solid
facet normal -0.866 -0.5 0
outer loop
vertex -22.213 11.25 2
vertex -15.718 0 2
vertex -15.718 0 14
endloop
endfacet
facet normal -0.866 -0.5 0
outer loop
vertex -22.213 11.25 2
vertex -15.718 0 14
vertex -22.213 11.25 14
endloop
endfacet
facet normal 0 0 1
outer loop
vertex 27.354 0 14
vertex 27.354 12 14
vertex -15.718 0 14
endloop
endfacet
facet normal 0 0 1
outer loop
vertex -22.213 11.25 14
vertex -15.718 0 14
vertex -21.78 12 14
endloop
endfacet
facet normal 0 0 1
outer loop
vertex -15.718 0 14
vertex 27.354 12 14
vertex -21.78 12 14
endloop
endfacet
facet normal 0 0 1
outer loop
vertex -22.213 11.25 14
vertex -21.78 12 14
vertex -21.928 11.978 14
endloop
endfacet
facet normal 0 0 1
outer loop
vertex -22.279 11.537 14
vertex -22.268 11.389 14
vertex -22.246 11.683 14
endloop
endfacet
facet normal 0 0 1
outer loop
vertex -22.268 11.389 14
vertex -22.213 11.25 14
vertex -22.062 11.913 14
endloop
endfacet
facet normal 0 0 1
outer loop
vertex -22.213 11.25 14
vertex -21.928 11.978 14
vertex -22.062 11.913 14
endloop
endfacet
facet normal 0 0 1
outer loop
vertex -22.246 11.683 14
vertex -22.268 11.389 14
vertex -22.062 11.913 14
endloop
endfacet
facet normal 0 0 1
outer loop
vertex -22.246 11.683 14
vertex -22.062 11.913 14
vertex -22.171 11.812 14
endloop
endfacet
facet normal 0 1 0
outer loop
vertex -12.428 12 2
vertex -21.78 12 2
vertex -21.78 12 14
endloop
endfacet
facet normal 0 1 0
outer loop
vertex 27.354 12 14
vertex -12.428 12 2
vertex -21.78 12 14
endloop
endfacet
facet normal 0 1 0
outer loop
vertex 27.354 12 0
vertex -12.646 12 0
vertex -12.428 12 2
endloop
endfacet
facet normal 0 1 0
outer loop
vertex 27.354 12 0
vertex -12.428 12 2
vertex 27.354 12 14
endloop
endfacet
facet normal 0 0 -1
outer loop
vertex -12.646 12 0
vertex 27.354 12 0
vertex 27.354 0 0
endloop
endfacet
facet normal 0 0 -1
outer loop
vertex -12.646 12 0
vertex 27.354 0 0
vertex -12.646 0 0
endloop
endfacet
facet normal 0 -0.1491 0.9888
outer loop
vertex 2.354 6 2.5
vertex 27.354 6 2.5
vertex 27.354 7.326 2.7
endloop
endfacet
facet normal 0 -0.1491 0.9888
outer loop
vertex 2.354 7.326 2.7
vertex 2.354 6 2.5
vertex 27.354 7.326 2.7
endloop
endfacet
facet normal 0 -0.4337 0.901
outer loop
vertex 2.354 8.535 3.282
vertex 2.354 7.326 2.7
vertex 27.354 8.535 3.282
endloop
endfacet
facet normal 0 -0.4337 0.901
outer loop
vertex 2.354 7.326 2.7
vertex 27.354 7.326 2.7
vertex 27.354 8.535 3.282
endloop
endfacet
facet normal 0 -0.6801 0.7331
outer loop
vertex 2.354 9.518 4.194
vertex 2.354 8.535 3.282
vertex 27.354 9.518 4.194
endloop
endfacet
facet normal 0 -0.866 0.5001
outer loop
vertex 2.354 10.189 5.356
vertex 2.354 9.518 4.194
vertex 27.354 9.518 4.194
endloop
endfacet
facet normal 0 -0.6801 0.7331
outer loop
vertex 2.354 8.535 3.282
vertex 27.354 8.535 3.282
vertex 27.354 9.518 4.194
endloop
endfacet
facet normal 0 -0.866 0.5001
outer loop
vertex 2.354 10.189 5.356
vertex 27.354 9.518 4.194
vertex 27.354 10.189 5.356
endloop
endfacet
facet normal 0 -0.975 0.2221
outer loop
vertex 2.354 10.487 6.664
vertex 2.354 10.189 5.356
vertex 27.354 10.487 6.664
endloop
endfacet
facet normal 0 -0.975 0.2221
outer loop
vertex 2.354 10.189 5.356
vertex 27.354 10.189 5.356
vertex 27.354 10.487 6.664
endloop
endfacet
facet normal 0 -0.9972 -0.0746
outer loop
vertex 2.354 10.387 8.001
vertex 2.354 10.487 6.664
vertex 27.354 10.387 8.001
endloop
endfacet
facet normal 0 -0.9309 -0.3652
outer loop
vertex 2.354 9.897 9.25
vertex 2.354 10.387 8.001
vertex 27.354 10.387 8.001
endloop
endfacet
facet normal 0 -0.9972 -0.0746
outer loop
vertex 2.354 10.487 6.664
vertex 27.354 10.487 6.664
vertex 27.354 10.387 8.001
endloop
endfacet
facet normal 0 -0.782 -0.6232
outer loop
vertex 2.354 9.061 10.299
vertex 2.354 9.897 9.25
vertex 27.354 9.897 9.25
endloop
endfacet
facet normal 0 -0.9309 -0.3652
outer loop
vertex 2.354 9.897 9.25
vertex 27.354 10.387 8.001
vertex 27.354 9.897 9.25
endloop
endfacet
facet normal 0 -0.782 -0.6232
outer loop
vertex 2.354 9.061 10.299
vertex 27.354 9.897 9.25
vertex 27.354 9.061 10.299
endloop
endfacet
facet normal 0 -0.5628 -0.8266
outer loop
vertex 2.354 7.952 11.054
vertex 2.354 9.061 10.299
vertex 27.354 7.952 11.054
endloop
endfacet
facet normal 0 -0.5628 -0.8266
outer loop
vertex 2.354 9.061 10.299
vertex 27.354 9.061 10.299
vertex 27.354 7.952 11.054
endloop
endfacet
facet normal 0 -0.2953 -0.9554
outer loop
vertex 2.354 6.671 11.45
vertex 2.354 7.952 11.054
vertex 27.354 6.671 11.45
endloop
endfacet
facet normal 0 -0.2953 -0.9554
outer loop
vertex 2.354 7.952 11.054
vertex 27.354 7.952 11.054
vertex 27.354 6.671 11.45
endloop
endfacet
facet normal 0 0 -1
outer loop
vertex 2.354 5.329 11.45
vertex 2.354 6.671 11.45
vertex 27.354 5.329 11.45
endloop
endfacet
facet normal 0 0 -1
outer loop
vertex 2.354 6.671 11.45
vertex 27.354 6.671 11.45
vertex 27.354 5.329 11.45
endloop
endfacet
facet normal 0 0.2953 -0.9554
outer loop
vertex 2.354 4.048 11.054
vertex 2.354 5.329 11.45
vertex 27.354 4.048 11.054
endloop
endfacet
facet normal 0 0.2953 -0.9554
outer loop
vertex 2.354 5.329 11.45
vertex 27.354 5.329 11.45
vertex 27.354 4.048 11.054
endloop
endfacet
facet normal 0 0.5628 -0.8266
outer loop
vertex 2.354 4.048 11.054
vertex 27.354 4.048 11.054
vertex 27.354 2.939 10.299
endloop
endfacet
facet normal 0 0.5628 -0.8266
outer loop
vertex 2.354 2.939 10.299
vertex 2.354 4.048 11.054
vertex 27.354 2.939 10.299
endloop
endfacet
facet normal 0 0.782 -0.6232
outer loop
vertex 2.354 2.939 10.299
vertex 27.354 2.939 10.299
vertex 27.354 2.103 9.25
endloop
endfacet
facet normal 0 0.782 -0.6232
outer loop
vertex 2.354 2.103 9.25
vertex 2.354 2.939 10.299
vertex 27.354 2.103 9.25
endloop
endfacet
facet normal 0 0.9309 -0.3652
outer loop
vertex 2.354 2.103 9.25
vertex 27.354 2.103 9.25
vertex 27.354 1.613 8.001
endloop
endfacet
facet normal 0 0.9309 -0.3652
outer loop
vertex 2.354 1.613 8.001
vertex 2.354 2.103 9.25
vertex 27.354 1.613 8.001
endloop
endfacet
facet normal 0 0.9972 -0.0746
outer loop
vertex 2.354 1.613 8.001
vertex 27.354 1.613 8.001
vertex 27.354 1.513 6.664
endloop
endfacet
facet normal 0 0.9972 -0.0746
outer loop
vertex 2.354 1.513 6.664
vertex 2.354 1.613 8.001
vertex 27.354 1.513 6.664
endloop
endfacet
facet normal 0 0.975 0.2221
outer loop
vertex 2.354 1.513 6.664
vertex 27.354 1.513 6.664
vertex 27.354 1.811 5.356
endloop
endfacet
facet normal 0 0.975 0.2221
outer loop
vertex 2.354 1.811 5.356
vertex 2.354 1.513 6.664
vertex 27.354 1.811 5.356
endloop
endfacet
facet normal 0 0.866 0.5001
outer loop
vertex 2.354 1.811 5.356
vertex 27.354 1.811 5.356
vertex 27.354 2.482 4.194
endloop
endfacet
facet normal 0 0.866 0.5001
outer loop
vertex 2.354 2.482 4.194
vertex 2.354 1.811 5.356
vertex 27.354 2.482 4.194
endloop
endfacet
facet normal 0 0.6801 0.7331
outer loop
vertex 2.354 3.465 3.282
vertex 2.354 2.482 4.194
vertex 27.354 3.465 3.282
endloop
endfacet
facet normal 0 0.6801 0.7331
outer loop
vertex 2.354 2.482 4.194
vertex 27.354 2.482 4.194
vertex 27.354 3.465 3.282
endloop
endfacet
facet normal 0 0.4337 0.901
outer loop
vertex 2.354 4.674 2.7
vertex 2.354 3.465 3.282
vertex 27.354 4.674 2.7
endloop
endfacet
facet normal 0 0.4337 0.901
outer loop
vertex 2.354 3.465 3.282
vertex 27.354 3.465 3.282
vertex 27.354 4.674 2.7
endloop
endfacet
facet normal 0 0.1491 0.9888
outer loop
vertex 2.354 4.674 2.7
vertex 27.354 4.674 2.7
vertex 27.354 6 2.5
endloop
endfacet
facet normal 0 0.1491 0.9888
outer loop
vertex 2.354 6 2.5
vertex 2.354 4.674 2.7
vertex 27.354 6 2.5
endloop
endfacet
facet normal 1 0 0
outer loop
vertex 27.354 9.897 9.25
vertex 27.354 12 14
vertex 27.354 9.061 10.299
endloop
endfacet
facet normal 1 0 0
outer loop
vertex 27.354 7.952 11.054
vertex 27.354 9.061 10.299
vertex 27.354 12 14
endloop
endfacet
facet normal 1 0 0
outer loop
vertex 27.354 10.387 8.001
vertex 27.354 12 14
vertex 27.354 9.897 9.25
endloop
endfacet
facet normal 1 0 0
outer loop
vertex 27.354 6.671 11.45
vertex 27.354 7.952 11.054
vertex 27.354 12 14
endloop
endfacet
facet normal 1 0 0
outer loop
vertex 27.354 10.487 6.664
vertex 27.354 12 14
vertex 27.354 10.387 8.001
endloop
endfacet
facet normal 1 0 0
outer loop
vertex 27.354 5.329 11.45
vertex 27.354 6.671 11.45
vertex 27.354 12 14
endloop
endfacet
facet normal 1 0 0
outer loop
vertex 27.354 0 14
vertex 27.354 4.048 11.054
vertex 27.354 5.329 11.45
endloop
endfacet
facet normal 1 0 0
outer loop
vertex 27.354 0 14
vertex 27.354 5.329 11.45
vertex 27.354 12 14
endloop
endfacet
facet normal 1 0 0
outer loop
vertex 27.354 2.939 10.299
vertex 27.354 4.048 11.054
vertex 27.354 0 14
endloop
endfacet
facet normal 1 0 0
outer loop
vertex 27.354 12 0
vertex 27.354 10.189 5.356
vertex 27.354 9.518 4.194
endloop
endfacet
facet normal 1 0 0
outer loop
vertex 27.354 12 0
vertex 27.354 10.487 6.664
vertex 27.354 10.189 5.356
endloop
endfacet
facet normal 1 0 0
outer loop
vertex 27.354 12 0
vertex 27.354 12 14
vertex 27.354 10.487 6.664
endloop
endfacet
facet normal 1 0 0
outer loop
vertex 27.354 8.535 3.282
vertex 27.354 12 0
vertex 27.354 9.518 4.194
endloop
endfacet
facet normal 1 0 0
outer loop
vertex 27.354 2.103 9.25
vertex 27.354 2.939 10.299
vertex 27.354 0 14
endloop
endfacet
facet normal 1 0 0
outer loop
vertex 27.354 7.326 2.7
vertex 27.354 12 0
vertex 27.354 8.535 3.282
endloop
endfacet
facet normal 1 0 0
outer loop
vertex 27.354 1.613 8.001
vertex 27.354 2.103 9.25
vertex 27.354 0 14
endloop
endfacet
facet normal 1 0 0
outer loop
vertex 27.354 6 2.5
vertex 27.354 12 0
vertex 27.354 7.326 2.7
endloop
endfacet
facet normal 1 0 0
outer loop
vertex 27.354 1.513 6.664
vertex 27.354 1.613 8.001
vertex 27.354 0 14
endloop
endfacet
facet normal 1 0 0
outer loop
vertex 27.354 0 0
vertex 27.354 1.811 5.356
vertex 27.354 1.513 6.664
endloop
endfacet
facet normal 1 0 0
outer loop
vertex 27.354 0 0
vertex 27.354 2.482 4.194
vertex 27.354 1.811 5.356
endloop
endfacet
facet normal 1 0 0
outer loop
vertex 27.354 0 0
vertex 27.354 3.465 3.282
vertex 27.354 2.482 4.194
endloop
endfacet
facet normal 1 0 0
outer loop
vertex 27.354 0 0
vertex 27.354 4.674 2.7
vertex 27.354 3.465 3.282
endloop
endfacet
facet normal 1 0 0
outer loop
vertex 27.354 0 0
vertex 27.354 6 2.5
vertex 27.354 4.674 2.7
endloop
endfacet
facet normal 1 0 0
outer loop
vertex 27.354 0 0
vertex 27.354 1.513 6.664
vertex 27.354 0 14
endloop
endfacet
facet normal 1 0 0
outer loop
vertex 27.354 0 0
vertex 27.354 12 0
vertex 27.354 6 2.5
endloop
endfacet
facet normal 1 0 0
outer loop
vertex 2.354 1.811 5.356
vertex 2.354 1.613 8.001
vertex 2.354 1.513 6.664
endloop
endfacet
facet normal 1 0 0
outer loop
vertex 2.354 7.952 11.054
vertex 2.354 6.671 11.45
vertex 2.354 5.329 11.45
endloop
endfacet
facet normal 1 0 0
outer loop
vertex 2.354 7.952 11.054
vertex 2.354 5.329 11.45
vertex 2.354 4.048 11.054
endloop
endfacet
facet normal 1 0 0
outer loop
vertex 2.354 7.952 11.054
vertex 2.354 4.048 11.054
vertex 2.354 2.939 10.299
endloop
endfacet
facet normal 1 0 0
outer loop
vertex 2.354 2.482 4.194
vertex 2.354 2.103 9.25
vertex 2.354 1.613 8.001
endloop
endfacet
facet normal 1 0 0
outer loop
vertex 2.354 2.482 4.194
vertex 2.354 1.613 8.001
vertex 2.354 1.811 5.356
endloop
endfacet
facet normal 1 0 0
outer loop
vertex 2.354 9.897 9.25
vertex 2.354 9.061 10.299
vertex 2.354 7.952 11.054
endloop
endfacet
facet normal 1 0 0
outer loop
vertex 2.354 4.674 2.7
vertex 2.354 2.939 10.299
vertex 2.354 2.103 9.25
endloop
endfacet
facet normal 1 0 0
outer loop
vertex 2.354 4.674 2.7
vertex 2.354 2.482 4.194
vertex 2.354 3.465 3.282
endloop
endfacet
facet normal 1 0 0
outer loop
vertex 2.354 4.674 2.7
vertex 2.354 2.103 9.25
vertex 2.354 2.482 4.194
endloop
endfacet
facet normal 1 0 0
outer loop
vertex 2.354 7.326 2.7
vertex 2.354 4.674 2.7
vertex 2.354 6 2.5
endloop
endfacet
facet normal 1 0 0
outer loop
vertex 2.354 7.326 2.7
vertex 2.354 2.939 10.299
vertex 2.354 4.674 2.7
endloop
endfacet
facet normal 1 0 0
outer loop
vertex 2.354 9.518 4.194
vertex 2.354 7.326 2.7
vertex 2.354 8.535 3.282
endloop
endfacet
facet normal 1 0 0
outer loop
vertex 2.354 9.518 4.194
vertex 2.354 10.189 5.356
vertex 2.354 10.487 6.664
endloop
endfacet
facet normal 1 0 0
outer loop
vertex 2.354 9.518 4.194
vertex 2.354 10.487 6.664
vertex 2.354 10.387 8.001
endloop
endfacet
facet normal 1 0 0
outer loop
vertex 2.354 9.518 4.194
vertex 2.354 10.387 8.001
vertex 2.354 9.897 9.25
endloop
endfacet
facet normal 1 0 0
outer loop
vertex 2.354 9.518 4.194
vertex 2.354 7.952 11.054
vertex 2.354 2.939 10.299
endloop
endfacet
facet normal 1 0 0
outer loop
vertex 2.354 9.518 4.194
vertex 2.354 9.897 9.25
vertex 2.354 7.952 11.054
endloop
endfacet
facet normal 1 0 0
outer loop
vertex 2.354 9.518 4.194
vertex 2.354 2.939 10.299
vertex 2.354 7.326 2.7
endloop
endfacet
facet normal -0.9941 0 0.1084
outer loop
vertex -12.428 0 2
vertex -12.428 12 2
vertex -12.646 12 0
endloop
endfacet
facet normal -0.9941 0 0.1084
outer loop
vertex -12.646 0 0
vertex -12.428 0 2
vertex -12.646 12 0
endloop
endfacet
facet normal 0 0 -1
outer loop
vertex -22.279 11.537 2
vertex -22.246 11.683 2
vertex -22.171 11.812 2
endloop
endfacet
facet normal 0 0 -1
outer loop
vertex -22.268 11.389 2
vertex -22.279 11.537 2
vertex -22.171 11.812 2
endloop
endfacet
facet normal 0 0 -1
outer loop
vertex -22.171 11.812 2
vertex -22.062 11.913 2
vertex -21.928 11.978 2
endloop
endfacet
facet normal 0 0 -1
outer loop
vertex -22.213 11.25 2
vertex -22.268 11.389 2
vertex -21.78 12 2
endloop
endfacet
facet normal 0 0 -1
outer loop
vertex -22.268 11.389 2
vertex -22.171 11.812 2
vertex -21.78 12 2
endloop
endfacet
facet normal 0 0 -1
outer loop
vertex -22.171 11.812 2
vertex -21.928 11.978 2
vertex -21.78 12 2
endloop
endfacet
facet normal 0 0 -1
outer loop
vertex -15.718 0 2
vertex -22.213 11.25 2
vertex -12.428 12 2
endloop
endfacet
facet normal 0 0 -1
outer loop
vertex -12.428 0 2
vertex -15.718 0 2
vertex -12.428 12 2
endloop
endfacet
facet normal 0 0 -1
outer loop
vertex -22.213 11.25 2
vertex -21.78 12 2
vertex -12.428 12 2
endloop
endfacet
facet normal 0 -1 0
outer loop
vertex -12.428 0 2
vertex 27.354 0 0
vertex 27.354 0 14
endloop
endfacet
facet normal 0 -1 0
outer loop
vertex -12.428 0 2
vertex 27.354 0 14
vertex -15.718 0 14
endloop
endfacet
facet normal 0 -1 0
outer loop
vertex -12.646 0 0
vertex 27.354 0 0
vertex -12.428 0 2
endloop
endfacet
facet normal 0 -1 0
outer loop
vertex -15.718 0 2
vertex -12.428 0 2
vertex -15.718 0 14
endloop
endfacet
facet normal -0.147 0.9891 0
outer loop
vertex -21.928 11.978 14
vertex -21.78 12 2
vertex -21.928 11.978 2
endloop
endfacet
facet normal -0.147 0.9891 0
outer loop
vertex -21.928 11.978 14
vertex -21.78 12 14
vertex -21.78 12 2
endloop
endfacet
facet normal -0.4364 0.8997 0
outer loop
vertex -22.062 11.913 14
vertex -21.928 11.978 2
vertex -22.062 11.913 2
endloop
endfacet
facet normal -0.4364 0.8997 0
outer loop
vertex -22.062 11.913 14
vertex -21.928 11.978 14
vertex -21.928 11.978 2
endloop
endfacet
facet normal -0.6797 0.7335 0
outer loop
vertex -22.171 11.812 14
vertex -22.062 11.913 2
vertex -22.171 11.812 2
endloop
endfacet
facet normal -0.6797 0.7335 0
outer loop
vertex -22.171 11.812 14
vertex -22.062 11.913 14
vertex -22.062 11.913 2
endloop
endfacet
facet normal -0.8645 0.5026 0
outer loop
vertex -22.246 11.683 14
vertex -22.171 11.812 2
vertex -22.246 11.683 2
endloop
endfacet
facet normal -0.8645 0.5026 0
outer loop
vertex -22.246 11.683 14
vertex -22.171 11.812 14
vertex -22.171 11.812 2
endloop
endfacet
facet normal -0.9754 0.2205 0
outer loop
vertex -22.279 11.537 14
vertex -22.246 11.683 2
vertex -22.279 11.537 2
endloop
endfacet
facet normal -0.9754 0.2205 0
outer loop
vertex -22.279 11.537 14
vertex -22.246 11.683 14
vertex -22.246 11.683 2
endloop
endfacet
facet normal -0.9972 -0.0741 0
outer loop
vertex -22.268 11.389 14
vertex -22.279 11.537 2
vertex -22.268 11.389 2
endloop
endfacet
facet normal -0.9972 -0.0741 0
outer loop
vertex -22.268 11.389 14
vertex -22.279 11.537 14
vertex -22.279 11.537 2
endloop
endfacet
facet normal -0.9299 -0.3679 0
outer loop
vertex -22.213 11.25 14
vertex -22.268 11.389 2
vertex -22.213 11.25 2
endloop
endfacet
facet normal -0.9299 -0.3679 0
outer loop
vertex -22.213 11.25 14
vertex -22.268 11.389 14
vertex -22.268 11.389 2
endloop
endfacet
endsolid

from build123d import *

# Parameters (mm, degrees)
EXTRUDE1_DEPTH     = 14
CUT_EXTRUDE1_DEPTH = 14
FILLET1_R          = 0.5
SKETCH3_R          = 4.5
CUT_EXTRUDE2_DEPTH = 25


with BuildPart() as part:
    # Sketch1 → Extrude1 (new body)
    with BuildSketch(Plane.XY):
        Polygon((-22.646297813, 12), (27.353702187, 12), (27.353702187, 0), (-15.718094583, 0), align=None)
    extrude(amount=EXTRUDE1_DEPTH)

    # Sketch2 → Cut-Extrude1 (cut)
    with BuildSketch(Plane(origin=(0, 12, 0), x_dir=(1, 0, 0), z_dir=(0, 1, 0))):
        Polygon((-22.646297813, -2), (-12.427539106, -2), (-12.646297813, 0), (-22.646297813, 0), align=None)
    extrude(amount=-CUT_EXTRUDE1_DEPTH, mode=Mode.SUBTRACT)

    # Fillet1
    fillet1_edges = [part.edges().sort_by_distance(p)[0] for p in [
        (-22.646297813, 12, 8),
    ]]
    fillet(fillet1_edges, radius=FILLET1_R)

    # Sketch3 → Cut-Extrude2 (cut)
    with BuildSketch(Plane(origin=(27.353702187, 0, 0), x_dir=(0, 0, -1), z_dir=(1, 0, 0))):
        with Locations((-7, 6)):
            Circle(SKETCH3_R)
    extrude(amount=-CUT_EXTRUDE2_DEPTH, mode=Mode.SUBTRACT)


solid = part.part
